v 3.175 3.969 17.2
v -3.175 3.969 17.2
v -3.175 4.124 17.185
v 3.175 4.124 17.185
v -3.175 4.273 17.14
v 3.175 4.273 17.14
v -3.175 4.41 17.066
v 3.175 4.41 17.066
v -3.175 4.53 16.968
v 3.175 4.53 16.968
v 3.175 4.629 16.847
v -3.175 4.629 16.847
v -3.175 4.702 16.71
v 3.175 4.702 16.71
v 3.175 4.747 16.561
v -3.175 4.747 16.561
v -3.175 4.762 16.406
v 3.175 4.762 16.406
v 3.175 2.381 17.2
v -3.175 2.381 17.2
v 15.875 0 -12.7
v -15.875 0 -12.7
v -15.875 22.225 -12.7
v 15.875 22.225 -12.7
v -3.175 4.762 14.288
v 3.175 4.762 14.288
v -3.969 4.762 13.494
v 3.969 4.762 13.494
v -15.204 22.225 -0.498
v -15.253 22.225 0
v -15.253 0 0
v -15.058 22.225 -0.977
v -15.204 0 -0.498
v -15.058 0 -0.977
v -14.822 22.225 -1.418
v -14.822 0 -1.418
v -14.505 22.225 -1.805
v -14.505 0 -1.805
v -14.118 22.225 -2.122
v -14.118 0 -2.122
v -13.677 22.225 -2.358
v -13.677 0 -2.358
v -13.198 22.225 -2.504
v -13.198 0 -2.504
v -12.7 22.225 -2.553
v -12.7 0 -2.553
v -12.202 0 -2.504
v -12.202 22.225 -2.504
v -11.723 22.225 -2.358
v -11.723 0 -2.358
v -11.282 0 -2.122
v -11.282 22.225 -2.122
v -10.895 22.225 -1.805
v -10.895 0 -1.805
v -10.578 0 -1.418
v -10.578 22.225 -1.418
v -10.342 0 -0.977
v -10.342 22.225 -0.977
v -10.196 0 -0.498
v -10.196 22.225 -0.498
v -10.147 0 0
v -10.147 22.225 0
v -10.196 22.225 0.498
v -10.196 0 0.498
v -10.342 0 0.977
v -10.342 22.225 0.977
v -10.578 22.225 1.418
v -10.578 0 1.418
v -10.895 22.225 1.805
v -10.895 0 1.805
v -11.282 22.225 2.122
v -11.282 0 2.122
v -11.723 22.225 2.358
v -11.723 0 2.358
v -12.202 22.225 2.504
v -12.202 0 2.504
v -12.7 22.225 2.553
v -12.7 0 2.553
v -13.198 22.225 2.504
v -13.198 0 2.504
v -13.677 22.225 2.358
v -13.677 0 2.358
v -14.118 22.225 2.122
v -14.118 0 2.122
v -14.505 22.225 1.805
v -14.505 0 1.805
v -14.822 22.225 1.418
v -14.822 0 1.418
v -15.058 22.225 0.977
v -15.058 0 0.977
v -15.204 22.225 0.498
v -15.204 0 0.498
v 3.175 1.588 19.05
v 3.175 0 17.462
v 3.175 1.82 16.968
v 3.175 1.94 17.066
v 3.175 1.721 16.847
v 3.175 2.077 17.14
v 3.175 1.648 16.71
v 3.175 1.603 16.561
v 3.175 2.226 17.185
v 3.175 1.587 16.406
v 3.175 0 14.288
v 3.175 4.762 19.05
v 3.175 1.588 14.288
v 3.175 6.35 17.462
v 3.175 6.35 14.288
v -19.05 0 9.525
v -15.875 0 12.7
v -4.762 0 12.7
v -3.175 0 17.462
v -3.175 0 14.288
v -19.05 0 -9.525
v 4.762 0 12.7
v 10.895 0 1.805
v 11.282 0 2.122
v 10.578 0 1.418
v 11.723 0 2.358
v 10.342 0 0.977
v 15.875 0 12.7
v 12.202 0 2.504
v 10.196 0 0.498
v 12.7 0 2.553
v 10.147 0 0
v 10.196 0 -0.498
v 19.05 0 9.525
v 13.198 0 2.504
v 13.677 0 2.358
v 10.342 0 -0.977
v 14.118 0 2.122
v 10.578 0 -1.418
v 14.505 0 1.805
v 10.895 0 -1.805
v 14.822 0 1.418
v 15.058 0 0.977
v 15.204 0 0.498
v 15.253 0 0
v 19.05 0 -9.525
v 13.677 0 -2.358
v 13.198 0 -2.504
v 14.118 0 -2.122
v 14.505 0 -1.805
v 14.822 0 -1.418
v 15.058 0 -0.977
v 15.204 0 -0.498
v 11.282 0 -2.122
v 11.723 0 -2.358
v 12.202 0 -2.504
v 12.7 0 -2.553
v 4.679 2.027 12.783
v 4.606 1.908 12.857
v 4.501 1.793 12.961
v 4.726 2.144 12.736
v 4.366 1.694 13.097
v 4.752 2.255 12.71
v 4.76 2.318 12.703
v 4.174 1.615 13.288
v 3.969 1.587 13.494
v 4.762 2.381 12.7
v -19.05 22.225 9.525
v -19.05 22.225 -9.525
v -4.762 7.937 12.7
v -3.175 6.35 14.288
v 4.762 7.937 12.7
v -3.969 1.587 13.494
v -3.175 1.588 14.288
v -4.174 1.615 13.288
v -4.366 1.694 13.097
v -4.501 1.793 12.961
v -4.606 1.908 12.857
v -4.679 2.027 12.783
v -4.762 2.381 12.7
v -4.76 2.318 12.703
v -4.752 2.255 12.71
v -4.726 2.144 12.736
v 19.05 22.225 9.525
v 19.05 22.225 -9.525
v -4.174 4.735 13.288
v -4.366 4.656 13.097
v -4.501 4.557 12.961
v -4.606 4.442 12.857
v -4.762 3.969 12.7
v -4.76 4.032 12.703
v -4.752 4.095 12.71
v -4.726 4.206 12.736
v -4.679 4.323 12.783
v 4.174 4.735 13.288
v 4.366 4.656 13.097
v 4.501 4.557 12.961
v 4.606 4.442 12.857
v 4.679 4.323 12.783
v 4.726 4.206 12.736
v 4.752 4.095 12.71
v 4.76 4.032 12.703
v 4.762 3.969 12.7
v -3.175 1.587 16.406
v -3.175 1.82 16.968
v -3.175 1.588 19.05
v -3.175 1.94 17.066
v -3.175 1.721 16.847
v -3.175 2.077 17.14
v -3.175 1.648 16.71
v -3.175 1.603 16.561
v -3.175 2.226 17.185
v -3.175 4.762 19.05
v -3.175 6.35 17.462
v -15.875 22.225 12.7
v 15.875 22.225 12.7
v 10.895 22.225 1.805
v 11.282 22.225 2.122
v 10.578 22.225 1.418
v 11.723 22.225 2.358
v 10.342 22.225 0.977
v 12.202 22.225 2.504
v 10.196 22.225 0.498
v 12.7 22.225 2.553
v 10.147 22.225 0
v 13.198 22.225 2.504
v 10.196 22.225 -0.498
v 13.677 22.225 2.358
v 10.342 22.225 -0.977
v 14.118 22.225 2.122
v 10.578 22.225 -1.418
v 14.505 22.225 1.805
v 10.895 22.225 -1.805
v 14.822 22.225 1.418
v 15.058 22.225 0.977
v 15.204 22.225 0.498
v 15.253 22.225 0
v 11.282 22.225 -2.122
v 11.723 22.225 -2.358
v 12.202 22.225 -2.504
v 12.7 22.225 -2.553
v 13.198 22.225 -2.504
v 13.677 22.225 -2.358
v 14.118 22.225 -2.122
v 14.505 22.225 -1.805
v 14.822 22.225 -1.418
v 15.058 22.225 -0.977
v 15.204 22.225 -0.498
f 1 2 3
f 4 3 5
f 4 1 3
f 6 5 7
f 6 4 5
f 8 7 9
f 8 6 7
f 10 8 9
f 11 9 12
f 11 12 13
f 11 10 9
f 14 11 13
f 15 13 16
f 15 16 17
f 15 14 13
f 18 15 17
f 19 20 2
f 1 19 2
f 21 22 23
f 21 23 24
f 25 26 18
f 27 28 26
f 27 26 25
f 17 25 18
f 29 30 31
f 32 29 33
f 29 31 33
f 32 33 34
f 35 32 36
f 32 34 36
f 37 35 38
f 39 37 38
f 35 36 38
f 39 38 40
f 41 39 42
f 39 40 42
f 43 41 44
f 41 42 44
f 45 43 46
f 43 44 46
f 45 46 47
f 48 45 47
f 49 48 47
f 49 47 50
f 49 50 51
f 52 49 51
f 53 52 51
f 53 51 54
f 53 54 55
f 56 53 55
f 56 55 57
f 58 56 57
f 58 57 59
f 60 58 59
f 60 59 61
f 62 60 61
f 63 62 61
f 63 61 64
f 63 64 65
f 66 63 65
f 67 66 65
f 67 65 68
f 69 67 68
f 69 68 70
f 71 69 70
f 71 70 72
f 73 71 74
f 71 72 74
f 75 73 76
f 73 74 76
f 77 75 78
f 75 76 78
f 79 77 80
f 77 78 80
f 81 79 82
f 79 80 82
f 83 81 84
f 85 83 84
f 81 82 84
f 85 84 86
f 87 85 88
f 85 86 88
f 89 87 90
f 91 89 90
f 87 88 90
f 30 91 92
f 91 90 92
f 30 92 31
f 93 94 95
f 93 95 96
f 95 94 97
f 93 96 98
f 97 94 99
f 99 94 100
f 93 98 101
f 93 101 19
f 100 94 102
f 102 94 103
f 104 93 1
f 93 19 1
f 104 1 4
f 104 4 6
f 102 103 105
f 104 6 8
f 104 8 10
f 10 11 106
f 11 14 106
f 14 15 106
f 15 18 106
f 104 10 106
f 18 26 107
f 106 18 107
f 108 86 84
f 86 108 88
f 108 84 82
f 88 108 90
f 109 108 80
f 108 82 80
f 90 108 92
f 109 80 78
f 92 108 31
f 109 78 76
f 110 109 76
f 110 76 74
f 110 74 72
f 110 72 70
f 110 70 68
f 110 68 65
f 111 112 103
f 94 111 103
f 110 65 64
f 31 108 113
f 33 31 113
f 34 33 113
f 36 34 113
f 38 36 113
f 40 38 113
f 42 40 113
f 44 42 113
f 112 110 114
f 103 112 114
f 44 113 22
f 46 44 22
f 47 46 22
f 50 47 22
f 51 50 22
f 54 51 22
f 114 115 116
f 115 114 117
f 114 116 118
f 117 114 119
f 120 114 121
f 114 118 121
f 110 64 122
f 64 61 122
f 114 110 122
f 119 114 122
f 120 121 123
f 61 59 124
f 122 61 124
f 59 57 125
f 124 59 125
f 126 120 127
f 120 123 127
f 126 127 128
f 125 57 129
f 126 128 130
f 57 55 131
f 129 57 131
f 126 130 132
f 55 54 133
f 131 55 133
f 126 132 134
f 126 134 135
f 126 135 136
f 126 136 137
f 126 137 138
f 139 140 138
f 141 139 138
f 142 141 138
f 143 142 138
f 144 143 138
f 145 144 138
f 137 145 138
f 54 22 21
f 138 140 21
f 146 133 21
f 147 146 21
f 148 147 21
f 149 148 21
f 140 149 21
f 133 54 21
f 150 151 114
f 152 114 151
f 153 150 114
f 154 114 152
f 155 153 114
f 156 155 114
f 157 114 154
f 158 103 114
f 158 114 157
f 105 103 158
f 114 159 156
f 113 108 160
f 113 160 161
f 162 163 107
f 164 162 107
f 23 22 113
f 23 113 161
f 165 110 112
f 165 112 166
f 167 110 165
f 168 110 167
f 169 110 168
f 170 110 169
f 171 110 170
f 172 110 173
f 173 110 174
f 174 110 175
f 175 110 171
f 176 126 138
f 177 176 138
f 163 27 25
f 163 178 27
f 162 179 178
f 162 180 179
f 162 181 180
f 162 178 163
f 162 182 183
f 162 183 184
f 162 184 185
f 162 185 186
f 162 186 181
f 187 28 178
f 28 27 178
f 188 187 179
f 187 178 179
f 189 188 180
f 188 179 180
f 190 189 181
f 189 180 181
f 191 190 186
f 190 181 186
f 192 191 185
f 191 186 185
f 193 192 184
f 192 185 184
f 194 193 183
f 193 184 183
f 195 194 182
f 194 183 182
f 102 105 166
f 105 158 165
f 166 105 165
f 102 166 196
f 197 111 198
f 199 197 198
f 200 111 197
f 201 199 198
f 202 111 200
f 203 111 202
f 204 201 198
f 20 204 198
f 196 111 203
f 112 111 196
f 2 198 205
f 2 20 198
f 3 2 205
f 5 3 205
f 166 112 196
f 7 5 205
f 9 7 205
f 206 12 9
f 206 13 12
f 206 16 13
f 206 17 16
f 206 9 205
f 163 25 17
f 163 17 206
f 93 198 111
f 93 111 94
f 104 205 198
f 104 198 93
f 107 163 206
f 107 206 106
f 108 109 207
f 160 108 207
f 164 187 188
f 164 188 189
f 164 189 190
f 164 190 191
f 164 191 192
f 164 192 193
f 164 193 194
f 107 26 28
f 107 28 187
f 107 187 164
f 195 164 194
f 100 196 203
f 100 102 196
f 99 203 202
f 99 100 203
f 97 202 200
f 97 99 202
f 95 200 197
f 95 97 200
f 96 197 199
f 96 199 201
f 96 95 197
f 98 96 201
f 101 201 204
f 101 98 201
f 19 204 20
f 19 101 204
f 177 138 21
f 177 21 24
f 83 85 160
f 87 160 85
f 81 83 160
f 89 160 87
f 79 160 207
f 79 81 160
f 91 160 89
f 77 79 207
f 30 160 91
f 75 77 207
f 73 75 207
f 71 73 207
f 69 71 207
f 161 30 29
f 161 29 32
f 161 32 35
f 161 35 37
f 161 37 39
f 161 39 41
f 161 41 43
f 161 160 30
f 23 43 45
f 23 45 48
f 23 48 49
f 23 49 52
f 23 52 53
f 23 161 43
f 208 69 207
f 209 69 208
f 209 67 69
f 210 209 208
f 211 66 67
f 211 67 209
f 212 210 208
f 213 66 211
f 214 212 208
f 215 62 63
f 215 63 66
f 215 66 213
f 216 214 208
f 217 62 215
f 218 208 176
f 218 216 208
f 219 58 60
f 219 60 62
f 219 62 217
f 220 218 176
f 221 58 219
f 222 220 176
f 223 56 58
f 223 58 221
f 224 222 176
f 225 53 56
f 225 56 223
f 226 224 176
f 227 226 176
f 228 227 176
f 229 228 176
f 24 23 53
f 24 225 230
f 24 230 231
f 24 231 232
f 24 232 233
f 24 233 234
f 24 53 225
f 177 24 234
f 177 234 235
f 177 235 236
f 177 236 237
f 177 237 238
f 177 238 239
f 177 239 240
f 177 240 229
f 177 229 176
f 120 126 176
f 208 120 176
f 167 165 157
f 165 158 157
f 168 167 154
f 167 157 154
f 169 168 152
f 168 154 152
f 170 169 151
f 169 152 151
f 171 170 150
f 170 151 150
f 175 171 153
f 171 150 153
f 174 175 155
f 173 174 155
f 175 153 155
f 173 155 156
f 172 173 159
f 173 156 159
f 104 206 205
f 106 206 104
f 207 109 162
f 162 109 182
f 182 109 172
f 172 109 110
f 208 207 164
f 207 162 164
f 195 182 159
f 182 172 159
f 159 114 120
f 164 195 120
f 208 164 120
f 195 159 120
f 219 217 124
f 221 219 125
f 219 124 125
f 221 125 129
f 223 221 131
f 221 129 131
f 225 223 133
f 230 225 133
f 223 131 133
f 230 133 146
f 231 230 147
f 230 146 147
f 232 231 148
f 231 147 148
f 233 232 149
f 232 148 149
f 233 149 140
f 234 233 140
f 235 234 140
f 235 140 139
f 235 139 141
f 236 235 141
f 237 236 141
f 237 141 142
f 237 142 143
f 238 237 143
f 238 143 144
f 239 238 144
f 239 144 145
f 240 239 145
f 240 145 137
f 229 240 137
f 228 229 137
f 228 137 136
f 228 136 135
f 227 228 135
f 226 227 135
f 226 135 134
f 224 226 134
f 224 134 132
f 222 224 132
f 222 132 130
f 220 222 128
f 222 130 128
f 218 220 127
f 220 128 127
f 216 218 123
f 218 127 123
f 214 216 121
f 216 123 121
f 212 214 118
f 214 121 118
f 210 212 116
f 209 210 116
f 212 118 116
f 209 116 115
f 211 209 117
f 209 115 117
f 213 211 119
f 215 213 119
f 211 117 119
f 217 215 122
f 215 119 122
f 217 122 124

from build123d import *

# Parameters (mm, degrees)
SKETCH1_W              = 38.1
SKETCH1_H              = 25.4
BOSS_EXTRUDE1_DEPTH    = 22.225
F_10_CLEARANCE_HOLE1_D = 5.1054
CHAMFER1_SIZE          = 3.175
SKETCH6_W              = 6.35
SKETCH6_H              = 6.35
BOSS_EXTRUDE3_DEPTH    = 6.35
CUT_EXTRUDE1_REACH     = 38.753
SKETCH7_W              = 4.5
SKETCH7_H              = 3.175
CHAMFER4_SIZE          = 1.5875
CHAMFER5_SIZE          = 1.5875
FILLET2_R              = 0.79375


with BuildPart() as part:
    # Sketch1 → Boss-Extrude1 (new body)
    with BuildSketch(Plane(origin=(0, 0, 0), x_dir=(1, 0, 0), z_dir=(0, 1, 0))):
        Rectangle(SKETCH1_W, SKETCH1_H)
    extrude(amount=BOSS_EXTRUDE1_DEPTH)

    # #10 Clearance Hole1 (through all)
    with Locations(Plane(origin=(0, 22.225, 0), x_dir=(1, 0, 0), z_dir=(0, 1, 0))):
        with Locations((-12.7, 0), (12.7, 0)):
            Hole(F_10_CLEARANCE_HOLE1_D / 2)

    # Chamfer1
    chamfer1_edges = [part.edges().sort_by_distance(p)[0] for p in [
        (19.05, 11.1125, 12.7),
        (-19.05, 11.1125, 12.7),
        (-19.05, 11.1125, -12.7),
        (19.05, 11.1125, -12.7),
    ]]
    chamfer(chamfer1_edges, length=CHAMFER1_SIZE)

    # Sketch6 → Boss-Extrude3 (add)
    with BuildSketch(Plane.XY.offset(12.7)):
        with Locations((0, 3.175)):
            Rectangle(SKETCH6_W, SKETCH6_H)
    extrude(amount=BOSS_EXTRUDE3_DEPTH)

    # Sketch7 → Cut-Extrude1 (cut, up to next)
    with BuildSketch(Plane.ZY.offset(3.175), mode=Mode.PRIVATE) as cut_extrude1_sk1:
        with Locations((14.95, 3.175)):
            Rectangle(SKETCH7_W, SKETCH7_H)
    cut_extrude1_tool1 = extrude(cut_extrude1_sk1.sketch, amount=-CUT_EXTRUDE1_REACH, mode=Mode.PRIVATE) & part.part
    add(cut_extrude1_tool1.solids().sort_by_distance((-3.175, 3.175, 14.95))[0], mode=Mode.SUBTRACT)

    # Chamfer4
    chamfer4_edges = [part.edges().sort_by_distance(p)[0] for p in [
        (0, 0, 19.05),
        (0, 6.35, 19.05),
    ]]
    chamfer(chamfer4_edges, length=CHAMFER4_SIZE)

    # Chamfer5
    chamfer5_edges = [part.edges().sort_by_distance(p)[0] for p in [
        (-3.175, 5.55625, 12.7),
        (3.175, 0.79375, 12.7),
        (0, 6.35, 12.7),
        (3.175, 5.55625, 12.7),
        (-3.175, 0.79375, 12.7),
    ]]
    chamfer(chamfer5_edges, length=CHAMFER5_SIZE)

    # Fillet2
    fillet2_edges = [part.edges().sort_by_distance(p)[0] for p in [
        (0, 4.7625, 17.2),
        (0, 1.5875, 17.2),
        (0, 1.5875, 12.7),
        (0, 4.7625, 12.7),
    ]]
    fillet(fillet2_edges, radius=FILLET2_R)


solid = part.part
